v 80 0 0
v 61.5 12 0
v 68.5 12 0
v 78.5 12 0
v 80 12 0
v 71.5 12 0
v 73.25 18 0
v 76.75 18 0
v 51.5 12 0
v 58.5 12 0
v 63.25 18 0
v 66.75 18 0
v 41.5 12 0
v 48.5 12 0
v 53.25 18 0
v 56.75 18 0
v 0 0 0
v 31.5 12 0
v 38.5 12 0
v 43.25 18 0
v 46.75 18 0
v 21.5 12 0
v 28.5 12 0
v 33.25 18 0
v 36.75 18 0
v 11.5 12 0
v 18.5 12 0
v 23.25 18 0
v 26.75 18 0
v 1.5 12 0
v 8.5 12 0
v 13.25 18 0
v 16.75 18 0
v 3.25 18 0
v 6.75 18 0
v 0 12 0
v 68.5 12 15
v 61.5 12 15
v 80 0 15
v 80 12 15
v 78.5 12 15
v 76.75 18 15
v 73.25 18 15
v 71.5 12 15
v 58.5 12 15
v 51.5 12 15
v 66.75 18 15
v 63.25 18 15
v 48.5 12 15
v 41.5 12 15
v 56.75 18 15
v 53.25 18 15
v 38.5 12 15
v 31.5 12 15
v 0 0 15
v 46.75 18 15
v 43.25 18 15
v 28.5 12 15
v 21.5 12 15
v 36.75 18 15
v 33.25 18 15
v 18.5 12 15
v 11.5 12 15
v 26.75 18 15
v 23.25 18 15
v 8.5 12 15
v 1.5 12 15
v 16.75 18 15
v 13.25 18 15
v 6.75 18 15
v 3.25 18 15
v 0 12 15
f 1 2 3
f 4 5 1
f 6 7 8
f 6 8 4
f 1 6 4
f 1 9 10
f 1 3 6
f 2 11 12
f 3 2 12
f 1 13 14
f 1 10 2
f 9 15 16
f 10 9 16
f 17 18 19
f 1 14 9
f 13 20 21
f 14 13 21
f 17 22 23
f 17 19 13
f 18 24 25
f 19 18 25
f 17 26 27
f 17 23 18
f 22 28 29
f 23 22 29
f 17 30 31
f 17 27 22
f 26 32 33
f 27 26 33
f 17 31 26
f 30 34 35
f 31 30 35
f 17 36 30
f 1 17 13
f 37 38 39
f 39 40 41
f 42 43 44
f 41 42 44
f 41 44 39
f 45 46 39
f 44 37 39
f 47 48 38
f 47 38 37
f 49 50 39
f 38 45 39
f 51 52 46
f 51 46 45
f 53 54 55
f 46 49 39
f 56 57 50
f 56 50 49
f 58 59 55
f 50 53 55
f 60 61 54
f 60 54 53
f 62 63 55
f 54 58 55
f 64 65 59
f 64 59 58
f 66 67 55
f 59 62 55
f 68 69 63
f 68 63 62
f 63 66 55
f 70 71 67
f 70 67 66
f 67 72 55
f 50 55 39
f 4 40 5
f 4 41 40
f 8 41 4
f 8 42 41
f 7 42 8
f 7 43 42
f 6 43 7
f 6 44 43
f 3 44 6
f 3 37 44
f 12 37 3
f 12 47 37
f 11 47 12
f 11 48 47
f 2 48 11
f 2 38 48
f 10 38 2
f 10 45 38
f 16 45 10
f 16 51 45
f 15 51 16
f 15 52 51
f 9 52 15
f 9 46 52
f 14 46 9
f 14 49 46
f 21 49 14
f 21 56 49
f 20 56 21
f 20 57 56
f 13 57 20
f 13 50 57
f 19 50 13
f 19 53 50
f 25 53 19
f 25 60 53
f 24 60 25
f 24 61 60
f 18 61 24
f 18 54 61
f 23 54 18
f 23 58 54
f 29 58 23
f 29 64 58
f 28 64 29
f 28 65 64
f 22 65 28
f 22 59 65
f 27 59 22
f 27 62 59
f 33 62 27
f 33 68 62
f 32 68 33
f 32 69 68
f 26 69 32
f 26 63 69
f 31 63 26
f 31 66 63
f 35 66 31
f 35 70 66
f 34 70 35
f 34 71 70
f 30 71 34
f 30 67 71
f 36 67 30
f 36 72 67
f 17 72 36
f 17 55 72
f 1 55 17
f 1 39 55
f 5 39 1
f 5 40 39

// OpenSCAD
$fn = 32;

// ----------------------------------------------------------------------
// Gear rack: 8 teeth, pitch 10 mm
// ----------------------------------------------------------------------

// --- parameters (mm) ---
teeth = 8;                // number of teeth
pitch = 10;               // tooth pitch, X
root_w = 7;               // tooth width at the root
tip_w = 3.5;              // tooth width at the tip
base_h = 12;              // rack body height, Y
tooth_h = 6;              // tooth height above the body
plate_t = 15;             // rack width, Z (extrusion height)

rack_l = teeth * pitch;  // overall length
total_h = base_h + tooth_h;  // overall height

profile = [[0, 0], [80, 0], [80, 12], [78.5, 12], [76.75, 18], [73.25, 18], [71.5, 12], [68.5, 12], [66.75, 18], [63.25, 18], [61.5, 12], [58.5, 12], [56.75, 18], [53.25, 18], [51.5, 12], [48.5, 12], [46.75, 18], [43.25, 18], [41.5, 12], [38.5, 12], [36.75, 18], [33.25, 18], [31.5, 12], [28.5, 12], [26.75, 18], [23.25, 18], [21.5, 12], [18.5, 12], [16.75, 18], [13.25, 18], [11.5, 12], [8.5, 12], [6.75, 18], [3.25, 18], [1.5, 12], [0, 12]];  // primary outline, 36 points, counter clockwise

// --- the one profile operation ---
linear_extrude(height = plate_t) polygon(points = profile);
